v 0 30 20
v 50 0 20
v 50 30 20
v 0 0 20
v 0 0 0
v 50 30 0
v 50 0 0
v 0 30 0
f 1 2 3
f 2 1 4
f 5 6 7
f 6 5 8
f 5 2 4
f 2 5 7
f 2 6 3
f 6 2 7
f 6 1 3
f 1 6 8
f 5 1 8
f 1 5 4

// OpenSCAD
// Define dimensions for the rectangular block
block_length = 50;  // Length of the block
block_width = 30;   // Width of the block
block_height = 20;  // Height of the block

// Create the rectangular block
cube([block_length, block_width, block_height]);
